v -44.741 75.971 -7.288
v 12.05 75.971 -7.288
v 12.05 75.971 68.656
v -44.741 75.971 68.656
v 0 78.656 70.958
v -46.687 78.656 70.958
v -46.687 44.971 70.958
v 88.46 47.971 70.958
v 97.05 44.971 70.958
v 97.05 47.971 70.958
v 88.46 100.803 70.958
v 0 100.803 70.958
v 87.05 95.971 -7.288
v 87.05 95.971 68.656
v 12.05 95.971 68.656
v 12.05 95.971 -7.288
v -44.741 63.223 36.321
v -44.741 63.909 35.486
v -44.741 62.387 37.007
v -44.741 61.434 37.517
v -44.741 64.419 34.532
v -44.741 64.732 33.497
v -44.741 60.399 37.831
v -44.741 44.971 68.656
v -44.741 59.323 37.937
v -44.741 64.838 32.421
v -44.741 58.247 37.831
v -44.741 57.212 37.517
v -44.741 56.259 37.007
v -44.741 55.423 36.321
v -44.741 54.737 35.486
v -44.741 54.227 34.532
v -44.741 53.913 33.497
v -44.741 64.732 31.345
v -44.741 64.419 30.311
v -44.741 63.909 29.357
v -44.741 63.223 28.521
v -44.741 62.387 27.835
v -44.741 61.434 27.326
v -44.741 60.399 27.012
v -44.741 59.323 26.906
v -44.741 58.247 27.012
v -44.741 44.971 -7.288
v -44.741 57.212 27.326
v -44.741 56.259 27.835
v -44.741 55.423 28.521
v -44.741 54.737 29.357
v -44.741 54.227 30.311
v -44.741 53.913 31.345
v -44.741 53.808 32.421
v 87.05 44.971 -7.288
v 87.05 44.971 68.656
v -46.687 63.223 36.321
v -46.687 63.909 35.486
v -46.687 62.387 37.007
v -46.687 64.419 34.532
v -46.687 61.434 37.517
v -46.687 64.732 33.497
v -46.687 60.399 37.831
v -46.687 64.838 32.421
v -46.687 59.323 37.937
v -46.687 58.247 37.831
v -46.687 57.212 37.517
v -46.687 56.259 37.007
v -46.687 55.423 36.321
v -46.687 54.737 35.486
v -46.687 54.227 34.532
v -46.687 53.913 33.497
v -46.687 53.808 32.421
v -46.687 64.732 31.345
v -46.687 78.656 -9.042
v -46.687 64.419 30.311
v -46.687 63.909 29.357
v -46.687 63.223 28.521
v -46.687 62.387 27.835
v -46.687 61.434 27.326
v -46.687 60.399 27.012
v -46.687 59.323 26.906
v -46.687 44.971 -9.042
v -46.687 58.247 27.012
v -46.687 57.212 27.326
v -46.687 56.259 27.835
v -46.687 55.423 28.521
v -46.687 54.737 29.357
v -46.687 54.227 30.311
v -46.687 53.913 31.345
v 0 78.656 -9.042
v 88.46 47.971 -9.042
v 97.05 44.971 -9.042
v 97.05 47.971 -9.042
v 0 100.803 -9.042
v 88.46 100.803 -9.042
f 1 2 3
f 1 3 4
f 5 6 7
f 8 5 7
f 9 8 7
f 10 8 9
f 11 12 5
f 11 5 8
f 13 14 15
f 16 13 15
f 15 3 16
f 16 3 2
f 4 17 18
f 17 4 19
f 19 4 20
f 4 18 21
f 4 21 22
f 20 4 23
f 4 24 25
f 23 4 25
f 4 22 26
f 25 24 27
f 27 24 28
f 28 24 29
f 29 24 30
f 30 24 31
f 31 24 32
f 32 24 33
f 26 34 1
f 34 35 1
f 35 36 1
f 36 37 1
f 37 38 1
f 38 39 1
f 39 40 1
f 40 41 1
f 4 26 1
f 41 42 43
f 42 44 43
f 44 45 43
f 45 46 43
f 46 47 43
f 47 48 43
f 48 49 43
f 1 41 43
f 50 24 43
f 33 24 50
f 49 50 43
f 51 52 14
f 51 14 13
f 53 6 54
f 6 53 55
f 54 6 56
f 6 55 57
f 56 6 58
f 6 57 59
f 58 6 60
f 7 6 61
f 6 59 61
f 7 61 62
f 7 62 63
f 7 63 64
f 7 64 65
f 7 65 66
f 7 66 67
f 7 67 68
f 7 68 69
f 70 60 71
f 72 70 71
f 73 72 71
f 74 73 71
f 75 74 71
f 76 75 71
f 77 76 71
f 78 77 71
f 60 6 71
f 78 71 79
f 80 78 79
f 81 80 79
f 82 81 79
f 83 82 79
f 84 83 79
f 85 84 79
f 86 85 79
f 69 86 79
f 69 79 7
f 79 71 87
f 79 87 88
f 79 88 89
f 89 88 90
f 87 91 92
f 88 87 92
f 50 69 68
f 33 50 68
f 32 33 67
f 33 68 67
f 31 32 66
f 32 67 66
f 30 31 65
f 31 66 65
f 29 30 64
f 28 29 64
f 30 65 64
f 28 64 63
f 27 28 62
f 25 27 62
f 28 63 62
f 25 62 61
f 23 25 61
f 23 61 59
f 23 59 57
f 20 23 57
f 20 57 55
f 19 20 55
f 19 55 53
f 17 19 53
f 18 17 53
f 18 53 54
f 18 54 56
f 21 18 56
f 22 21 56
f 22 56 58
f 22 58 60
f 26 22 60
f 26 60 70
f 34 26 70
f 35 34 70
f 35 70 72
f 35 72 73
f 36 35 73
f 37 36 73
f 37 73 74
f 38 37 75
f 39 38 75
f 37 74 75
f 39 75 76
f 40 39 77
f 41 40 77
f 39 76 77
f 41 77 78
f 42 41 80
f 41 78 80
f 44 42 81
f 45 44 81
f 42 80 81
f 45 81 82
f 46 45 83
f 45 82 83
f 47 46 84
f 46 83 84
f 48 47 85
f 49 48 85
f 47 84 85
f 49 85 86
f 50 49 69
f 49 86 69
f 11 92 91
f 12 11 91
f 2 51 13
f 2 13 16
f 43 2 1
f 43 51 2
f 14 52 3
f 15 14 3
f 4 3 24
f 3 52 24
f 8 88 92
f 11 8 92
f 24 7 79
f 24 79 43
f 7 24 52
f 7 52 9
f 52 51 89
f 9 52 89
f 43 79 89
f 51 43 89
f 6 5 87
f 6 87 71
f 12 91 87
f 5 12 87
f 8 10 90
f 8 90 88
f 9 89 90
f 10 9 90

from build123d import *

# Parameters (mm, degrees)
BOSS_EXTRUDE1_DEPTH      = 70.958248
BOSS_EXTRUDE1_DEPTH_BACK = 9.041752
SKETCH3_R                = 5.515432893
CUT_EXTRUDE1_DEPTH       = 22
SKETCH4_W                = 56.790594551
SKETCH4_H                = 75.94381824
CUT_EXTRUDE2_DEPTH       = 31
SKETCH5_W                = 75
SKETCH5_H                = 75.94381824
CUT_EXTRUDE3_DEPTH       = 51


with BuildPart() as part:
    # Sketch1 → Boss-Extrude1 (new, two sides: drawn at the far end of the back side and taken through both)
    with BuildSketch(Plane.XY.offset(-BOSS_EXTRUDE1_DEPTH_BACK)):
        Polygon((97.04953752, 44.971194673), (97.04953752, 47.971194673), (88.459572821, 47.971194673), (88.459572821, 100.803034254), (0, 100.803034254), (0, 78.655691188), (-46.687150509, 78.655691188), (-46.687150509, 44.971194673), align=None)
    extrude(amount=BOSS_EXTRUDE1_DEPTH + BOSS_EXTRUDE1_DEPTH_BACK)

    # Sketch3 → Cut-Extrude1 (cut)
    with BuildSketch(Plane.ZY.offset(46.687150509)):
        with Locations(Location((32.421386427, 59.322946804, 0), (0, 0, 270))):
            Circle(SKETCH3_R)
    extrude(amount=-CUT_EXTRUDE1_DEPTH, mode=Mode.SUBTRACT)

    # Sketch4 → Cut-Extrude2 (cut)
    with BuildSketch(Plane(origin=(0, 44.971194673, 0), x_dir=(-1, 0, 0), z_dir=(0, -1, 0))):
        with Locations((16.345759756, -30.684219126)):
            Rectangle(SKETCH4_W, SKETCH4_H)
    extrude(amount=-CUT_EXTRUDE2_DEPTH, mode=Mode.SUBTRACT)

    # Sketch5 → Cut-Extrude3 (cut)
    with BuildSketch(Plane(origin=(0, 44.971194673, 0), x_dir=(-1, 0, 0), z_dir=(0, -1, 0))):
        with Locations((-49.54953752, -30.684219126)):
            Rectangle(SKETCH5_W, SKETCH5_H)
    extrude(amount=-CUT_EXTRUDE3_DEPTH, mode=Mode.SUBTRACT)


solid = part.part
